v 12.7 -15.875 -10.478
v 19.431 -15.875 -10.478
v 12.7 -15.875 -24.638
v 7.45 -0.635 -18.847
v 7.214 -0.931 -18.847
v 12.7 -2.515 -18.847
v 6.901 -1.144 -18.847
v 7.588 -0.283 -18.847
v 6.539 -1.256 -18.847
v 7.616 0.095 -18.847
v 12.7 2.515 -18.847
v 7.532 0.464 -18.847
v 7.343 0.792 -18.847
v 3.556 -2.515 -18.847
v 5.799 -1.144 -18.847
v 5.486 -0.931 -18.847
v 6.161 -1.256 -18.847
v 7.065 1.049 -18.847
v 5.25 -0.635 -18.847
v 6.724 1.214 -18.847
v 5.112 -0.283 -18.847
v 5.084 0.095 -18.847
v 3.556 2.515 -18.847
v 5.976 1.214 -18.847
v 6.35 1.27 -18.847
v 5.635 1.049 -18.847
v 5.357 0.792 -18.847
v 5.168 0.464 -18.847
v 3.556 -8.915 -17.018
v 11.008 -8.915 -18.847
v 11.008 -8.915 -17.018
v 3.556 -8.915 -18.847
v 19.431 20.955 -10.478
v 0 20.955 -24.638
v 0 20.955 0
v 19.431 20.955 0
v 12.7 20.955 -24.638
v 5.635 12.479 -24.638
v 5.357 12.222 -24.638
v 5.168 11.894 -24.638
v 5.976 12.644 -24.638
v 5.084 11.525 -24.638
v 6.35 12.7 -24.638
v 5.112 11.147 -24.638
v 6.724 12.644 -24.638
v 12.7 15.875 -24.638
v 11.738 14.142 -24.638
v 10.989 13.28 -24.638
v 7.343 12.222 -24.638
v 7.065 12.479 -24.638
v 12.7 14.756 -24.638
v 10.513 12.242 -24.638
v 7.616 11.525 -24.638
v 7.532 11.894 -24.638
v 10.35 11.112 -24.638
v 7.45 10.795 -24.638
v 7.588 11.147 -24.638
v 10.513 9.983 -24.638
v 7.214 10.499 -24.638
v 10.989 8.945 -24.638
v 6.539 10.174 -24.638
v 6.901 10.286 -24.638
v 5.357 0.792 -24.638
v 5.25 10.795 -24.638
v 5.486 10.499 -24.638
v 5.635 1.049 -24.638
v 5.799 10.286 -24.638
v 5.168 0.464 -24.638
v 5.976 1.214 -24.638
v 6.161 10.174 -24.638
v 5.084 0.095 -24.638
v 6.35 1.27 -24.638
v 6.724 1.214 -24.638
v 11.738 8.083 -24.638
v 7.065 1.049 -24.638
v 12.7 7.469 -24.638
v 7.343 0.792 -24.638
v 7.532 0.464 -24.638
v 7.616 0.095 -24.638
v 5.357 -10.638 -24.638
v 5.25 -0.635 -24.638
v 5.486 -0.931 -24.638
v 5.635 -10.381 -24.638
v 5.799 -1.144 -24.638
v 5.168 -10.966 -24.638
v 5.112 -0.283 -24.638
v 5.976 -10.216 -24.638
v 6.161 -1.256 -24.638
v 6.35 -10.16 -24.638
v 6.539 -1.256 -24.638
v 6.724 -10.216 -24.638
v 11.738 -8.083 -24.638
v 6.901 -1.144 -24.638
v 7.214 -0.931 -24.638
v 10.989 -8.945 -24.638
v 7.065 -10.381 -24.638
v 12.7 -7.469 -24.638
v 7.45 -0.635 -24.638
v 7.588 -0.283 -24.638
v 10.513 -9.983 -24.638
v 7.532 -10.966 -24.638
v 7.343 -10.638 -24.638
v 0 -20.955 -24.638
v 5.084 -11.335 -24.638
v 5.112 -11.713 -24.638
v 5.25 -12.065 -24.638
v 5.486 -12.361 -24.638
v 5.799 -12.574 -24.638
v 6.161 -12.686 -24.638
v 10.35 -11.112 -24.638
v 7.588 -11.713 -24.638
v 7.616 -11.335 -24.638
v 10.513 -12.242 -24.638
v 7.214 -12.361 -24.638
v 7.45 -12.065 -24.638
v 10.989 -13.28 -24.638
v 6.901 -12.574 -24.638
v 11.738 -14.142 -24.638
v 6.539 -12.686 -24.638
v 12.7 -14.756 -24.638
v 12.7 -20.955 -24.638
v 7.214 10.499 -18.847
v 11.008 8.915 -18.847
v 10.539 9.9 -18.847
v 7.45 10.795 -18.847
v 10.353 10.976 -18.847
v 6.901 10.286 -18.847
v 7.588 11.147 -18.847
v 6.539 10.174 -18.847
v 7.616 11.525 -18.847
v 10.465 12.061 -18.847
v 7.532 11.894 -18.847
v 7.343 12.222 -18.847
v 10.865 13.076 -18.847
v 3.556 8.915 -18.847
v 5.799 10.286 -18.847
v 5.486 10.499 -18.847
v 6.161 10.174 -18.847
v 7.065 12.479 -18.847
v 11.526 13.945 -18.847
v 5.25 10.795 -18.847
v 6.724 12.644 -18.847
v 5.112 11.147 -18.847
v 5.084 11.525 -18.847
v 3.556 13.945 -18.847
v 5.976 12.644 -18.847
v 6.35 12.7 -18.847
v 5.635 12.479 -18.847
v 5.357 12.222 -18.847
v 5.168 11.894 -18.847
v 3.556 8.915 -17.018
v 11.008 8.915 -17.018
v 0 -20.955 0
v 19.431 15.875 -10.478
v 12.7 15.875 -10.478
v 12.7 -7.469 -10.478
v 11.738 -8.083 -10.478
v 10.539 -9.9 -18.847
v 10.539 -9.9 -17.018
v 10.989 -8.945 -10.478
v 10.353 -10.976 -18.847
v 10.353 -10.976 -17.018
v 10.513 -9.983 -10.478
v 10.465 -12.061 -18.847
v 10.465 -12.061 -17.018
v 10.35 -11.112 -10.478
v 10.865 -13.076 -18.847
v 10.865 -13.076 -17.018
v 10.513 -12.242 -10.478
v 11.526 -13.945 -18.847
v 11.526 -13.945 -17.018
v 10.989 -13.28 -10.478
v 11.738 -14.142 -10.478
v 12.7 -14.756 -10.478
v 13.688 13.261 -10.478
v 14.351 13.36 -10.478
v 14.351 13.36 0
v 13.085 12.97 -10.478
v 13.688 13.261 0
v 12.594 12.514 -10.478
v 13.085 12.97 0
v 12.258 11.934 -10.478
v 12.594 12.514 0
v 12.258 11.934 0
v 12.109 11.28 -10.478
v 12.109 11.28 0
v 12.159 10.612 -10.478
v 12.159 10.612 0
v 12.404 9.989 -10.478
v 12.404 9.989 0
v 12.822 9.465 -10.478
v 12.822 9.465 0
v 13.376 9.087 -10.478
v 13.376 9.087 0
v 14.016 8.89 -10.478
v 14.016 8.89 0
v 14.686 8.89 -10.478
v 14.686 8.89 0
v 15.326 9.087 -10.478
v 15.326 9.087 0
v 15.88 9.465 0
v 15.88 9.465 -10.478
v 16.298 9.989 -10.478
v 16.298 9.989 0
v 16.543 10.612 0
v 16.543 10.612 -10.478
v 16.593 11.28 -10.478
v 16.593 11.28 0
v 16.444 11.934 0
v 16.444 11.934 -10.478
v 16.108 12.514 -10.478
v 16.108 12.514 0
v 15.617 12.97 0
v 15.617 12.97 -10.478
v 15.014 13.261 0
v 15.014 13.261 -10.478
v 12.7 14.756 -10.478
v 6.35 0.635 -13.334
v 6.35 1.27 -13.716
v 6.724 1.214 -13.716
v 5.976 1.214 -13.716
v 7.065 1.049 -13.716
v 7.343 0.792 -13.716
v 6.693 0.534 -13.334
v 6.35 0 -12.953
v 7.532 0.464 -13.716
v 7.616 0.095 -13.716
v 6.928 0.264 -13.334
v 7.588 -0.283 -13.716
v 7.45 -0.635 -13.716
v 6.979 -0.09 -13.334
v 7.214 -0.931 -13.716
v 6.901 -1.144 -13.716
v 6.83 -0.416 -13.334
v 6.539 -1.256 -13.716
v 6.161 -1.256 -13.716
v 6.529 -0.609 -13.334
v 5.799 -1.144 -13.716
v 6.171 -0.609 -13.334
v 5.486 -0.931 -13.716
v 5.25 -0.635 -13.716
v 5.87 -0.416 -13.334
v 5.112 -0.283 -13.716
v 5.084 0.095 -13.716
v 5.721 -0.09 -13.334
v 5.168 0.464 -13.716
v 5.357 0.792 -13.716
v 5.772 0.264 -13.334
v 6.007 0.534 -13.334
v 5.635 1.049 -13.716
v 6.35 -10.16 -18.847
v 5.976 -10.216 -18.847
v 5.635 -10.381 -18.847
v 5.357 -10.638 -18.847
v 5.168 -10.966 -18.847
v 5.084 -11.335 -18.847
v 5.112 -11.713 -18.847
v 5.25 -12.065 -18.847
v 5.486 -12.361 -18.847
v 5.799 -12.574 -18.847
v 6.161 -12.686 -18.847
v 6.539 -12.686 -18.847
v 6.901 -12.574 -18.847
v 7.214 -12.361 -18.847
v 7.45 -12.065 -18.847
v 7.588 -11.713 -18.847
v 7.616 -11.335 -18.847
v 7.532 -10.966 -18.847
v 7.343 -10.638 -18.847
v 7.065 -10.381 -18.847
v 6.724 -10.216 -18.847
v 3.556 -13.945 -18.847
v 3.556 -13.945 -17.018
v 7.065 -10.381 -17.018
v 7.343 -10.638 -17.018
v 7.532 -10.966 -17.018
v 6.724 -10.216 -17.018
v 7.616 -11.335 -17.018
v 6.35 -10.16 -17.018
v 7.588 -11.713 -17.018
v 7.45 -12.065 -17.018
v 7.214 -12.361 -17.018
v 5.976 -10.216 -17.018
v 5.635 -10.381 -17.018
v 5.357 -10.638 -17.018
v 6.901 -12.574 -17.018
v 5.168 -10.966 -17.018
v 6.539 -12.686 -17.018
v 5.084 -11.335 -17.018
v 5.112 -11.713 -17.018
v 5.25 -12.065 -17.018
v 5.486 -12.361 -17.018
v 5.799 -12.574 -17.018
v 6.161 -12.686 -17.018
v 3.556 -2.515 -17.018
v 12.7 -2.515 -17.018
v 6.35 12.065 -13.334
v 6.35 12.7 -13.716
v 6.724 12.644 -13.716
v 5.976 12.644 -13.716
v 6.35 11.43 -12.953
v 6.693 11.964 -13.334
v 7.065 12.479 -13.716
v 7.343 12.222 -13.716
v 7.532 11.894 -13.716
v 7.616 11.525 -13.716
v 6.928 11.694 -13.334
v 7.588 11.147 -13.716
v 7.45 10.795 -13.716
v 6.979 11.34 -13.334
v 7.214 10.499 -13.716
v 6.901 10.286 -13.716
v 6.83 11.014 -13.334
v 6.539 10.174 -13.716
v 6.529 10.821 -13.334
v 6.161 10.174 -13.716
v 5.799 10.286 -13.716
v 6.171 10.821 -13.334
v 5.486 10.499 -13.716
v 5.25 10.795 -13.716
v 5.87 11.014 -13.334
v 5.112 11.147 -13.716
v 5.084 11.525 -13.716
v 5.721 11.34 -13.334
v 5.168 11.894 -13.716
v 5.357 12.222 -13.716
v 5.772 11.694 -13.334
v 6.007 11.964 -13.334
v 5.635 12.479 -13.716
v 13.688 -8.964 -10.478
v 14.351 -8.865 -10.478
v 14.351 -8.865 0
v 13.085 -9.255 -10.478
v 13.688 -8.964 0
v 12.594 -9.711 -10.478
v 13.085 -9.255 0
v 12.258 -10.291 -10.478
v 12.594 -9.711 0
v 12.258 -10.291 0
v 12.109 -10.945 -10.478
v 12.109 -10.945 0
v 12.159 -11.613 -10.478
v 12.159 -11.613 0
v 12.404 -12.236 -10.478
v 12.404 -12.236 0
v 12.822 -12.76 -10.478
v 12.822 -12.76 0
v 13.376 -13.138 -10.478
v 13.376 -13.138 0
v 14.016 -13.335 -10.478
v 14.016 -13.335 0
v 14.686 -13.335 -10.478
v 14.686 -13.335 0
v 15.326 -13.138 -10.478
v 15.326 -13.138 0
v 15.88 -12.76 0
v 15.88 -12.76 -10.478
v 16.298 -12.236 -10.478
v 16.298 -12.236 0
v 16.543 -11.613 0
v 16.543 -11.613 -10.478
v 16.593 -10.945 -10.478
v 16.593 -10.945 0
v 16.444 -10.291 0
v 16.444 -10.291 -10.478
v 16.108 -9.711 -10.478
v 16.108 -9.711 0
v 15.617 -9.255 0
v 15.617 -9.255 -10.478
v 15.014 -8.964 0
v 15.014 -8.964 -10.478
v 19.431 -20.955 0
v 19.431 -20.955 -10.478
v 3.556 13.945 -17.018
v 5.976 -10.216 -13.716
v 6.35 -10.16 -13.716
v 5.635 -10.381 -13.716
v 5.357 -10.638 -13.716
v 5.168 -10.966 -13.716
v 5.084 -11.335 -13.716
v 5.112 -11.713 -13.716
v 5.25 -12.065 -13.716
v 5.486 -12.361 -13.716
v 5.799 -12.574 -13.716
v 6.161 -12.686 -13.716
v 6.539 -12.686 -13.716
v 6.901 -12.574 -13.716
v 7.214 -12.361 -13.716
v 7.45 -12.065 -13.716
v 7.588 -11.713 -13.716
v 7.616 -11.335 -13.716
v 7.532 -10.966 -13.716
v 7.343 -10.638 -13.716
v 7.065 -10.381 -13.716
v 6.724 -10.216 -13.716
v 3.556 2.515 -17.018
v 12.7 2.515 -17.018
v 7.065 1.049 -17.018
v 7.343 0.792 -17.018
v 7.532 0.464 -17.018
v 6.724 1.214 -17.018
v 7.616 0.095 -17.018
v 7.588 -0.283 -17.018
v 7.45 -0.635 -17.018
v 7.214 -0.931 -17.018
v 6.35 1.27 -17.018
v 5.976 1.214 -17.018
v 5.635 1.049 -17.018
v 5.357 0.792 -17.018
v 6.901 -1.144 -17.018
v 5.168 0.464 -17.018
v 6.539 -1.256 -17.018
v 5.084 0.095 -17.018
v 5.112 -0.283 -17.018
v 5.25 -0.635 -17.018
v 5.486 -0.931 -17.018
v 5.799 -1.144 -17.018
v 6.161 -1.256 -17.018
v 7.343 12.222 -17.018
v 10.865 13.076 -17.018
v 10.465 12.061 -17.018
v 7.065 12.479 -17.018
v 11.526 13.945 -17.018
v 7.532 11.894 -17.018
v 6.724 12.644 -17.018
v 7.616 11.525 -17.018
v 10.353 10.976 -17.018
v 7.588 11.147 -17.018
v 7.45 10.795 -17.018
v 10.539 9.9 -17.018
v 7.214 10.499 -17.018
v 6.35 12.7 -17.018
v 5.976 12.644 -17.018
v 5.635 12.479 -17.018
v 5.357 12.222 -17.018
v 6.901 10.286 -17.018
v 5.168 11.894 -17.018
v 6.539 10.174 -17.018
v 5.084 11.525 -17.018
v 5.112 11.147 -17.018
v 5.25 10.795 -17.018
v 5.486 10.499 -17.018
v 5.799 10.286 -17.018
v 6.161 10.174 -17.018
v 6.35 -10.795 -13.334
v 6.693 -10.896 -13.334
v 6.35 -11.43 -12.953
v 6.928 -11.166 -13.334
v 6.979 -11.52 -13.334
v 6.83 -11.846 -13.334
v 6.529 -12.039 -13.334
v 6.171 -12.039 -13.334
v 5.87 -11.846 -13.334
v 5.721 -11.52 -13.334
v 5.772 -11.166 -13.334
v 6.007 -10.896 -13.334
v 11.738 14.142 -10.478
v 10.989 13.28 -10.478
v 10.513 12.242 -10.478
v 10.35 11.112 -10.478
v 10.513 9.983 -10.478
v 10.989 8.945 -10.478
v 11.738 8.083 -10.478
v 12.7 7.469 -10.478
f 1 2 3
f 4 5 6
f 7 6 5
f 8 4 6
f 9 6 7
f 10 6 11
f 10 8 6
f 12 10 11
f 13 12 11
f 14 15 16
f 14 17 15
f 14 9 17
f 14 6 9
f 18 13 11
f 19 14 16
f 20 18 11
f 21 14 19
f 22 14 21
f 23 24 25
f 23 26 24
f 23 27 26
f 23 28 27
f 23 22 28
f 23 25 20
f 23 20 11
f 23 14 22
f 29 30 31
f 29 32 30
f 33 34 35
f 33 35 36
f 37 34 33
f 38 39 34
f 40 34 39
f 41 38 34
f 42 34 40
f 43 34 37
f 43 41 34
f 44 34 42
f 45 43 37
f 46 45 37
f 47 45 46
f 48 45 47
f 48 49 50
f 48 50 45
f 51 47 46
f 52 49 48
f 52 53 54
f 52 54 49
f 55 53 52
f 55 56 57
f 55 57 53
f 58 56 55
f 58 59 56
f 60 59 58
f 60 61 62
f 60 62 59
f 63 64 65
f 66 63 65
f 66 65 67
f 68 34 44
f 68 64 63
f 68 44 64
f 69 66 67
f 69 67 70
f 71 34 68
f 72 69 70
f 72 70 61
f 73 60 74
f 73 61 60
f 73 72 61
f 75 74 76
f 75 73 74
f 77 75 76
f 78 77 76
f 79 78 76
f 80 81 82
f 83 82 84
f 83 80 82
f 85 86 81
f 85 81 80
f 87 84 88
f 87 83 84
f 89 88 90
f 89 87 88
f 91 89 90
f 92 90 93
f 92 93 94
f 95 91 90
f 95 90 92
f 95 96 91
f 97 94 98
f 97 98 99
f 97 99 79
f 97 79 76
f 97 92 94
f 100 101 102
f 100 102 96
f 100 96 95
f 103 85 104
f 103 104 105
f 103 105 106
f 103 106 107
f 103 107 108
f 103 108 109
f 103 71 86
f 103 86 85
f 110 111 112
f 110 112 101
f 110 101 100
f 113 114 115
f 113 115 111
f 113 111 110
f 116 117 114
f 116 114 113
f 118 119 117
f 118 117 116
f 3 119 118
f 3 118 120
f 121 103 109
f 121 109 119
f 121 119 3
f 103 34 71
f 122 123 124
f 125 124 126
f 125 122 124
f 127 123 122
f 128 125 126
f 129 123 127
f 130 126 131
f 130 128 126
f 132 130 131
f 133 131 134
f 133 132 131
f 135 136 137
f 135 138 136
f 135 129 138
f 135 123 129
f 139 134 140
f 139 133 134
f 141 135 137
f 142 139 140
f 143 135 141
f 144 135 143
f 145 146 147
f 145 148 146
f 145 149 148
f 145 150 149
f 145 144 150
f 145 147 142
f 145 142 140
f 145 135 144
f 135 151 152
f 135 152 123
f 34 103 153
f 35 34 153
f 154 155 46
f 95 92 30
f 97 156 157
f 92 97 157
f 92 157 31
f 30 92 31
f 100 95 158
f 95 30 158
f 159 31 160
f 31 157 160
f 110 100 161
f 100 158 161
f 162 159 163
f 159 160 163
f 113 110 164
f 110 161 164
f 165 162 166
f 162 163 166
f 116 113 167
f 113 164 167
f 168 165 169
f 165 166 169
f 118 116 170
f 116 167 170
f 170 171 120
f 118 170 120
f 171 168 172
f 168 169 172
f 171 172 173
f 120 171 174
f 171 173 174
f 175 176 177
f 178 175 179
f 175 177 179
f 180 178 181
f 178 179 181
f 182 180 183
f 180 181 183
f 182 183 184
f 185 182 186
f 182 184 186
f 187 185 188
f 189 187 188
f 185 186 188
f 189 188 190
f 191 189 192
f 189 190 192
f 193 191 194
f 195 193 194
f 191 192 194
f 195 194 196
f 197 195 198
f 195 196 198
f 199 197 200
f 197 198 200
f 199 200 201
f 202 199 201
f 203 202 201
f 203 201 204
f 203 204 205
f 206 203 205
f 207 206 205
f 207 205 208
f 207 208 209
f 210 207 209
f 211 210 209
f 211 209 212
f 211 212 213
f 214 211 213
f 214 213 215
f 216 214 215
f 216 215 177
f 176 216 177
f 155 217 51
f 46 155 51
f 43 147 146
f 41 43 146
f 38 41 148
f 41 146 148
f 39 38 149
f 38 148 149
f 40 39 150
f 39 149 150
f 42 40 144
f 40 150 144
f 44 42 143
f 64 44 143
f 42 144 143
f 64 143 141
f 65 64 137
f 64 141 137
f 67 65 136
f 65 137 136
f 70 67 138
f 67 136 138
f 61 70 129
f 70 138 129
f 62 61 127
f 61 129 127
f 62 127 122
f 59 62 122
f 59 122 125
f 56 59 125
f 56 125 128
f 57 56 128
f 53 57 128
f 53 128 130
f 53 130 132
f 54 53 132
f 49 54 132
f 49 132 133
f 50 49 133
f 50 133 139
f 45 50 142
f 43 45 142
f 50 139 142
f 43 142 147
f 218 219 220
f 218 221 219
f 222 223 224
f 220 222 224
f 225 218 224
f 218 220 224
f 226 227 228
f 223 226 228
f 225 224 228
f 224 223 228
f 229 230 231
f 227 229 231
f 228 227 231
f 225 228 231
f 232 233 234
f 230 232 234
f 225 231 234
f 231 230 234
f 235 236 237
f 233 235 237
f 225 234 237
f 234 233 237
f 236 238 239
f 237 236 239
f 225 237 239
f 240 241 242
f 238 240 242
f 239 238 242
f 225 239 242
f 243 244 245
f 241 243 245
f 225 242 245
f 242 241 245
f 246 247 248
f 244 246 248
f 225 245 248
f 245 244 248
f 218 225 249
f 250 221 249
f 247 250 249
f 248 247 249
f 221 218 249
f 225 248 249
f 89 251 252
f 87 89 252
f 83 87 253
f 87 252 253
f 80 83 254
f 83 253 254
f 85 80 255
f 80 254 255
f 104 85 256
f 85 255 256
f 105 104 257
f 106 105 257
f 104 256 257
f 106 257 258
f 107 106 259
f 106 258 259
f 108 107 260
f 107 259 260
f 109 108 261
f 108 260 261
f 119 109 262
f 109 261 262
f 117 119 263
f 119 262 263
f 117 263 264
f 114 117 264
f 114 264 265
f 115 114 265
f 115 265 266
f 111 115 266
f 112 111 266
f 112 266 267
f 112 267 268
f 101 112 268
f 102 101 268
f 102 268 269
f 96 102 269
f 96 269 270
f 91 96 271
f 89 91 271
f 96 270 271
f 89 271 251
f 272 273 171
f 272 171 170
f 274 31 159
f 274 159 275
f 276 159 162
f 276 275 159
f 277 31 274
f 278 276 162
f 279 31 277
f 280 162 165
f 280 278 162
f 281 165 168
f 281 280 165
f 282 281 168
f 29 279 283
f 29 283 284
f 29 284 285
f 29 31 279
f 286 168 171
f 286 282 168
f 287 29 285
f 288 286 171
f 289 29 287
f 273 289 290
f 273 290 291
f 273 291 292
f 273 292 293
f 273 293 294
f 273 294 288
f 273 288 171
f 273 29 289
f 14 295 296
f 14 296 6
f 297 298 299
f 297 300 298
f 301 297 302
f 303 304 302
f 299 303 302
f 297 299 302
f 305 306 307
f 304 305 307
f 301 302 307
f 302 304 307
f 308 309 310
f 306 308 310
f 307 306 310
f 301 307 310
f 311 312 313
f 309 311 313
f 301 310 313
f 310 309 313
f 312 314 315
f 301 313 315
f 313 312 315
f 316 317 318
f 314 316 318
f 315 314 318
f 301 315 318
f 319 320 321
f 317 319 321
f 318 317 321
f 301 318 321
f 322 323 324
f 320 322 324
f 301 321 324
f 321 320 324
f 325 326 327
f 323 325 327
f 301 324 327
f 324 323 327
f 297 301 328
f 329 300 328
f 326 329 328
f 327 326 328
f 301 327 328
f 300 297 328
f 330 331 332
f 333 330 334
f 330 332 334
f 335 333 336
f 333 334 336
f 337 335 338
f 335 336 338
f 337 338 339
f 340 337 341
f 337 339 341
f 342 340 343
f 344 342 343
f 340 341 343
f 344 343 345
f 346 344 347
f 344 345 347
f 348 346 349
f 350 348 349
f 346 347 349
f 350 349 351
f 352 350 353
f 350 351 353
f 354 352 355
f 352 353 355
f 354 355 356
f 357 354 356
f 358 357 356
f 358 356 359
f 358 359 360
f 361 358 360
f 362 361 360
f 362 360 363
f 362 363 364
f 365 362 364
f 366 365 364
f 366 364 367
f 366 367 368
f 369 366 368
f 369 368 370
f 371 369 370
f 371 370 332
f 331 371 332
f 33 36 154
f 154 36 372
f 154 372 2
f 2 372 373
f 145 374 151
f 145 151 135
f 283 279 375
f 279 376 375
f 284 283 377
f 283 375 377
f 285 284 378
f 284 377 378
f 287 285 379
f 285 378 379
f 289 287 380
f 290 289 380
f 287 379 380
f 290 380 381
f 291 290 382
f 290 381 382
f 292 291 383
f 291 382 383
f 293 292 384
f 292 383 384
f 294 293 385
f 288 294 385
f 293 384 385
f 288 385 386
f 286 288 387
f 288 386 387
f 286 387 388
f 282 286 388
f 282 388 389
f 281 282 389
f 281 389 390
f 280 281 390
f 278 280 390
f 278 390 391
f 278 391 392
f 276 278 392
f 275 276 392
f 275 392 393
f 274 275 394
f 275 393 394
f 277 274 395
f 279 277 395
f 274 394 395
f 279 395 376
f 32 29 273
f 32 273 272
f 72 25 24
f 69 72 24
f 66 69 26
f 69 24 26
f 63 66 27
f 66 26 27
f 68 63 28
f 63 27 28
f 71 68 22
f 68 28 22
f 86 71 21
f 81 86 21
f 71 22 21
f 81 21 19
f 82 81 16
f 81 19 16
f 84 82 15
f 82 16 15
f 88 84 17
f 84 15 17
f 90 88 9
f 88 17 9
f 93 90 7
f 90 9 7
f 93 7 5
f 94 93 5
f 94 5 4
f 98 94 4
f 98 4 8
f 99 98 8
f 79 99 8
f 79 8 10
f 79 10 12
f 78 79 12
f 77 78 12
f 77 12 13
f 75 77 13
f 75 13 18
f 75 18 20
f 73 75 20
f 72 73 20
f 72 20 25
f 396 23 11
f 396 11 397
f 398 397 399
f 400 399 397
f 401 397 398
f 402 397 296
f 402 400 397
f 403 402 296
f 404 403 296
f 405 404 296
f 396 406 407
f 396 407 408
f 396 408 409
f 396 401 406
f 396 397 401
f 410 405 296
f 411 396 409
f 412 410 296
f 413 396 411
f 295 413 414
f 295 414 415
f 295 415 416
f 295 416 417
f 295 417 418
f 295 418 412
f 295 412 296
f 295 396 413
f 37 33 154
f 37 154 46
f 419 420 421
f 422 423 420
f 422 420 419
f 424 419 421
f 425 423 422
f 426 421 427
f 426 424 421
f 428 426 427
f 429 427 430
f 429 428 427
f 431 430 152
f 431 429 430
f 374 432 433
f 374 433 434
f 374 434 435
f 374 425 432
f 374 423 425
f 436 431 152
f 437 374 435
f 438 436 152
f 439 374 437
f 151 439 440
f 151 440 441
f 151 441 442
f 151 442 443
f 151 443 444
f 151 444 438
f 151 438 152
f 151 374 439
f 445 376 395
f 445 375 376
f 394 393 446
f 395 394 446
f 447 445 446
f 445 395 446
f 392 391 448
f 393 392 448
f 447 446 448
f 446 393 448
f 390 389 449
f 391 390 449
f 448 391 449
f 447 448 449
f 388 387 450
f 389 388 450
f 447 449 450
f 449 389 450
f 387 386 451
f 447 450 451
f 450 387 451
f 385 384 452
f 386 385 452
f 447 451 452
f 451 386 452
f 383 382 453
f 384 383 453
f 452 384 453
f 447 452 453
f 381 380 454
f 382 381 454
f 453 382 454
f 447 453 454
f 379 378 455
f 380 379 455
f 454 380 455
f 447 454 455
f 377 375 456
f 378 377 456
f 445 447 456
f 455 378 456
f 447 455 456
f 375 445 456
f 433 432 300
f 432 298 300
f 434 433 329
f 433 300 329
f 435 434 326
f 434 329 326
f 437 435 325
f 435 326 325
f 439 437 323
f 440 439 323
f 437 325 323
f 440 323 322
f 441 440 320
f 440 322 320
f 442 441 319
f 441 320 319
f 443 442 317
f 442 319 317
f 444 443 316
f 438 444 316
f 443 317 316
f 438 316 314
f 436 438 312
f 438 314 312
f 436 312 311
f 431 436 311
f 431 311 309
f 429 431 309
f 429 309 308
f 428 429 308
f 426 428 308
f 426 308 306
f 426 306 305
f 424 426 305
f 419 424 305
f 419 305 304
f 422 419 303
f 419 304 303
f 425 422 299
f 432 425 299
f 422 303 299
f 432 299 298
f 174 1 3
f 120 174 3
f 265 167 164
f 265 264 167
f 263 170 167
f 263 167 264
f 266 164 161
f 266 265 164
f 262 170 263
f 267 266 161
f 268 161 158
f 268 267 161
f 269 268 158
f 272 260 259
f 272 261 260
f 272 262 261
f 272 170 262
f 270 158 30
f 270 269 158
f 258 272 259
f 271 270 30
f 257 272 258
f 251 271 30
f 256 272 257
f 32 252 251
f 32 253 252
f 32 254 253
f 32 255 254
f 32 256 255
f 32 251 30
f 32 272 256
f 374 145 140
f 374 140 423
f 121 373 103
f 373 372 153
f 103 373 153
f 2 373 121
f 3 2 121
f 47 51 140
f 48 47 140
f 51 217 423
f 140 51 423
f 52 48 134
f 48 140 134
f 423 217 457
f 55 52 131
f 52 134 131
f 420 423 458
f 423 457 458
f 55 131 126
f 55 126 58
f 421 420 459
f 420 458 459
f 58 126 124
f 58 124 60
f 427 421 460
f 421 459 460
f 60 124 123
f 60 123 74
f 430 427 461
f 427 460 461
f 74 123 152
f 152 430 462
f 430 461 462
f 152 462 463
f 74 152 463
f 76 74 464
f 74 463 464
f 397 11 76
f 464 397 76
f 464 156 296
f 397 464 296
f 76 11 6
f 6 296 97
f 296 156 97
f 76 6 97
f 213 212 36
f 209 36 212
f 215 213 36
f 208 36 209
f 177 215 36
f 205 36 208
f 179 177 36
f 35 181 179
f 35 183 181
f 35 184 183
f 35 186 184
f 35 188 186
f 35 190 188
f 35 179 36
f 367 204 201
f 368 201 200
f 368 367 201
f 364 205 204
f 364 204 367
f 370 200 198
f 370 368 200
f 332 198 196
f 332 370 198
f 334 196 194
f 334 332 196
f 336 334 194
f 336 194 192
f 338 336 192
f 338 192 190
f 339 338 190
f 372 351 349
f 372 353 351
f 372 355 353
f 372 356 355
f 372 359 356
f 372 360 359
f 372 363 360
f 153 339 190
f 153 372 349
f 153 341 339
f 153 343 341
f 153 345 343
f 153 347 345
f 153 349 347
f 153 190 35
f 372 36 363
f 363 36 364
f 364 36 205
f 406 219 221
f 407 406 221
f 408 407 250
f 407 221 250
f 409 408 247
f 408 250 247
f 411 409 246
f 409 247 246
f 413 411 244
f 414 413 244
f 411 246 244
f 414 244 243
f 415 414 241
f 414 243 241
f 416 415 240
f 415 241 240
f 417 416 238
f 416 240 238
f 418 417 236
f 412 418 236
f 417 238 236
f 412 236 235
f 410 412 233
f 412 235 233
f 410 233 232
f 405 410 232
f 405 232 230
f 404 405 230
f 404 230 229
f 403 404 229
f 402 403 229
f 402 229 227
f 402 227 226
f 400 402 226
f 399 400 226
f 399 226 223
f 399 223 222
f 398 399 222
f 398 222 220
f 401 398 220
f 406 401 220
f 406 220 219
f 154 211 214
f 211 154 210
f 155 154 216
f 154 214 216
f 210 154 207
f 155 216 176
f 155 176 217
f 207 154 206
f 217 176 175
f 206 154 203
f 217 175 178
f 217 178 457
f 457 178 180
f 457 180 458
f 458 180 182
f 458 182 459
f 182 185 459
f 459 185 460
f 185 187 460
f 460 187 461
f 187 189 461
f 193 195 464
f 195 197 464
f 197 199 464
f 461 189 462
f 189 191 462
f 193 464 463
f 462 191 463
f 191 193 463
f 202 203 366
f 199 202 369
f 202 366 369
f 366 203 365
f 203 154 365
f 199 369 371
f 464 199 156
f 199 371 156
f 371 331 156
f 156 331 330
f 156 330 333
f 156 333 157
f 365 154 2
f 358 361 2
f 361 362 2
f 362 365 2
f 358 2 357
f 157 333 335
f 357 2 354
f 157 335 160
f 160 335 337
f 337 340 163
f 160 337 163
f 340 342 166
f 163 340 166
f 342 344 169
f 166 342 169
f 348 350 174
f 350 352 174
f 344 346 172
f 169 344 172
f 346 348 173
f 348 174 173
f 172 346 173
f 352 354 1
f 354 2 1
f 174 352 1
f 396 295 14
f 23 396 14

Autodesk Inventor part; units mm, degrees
ref_plane "YZ Plane" through (0, 0, 0) normal (1, 0, 0) x (0, 1, 0)
ref_plane "XZ Plane" through (0, 0, 0) normal (0, 1, 0) x (-1, 0, 0)
ref_plane "XY Plane" through (0, 0, 0) normal (0, 0, 1) x (1, 0, 0)
sketch "Sketch1" plane through (0, 0, 0) normal (0, 1, 0) x (-1, 0, 0)
  line L0 (0, -29.5656) -> (0, 4.9276) projected
  line L1 (-23.3172, 0) -> (3.8862, 0) projected
  line L2 (0, 0) -> (-19.431, 0)
  line L3 (-19.431, 0) -> (-19.431, -10.4775)
  line L4 (-19.431, -10.4775) -> (0, -10.4775)
  line L5 (0, -10.4775) -> (0, 0)
  line L6 (0, -10.4775) -> (-12.7, -10.4775)
  line L7 (-12.7, -10.4775) -> (-12.7, -24.638)
  line L8 (0, -24.638) -> (0, -10.4775)
  line L9 (0, -24.638) -> (-12.7, -24.638)
  dimension "d10" = 10.4775
  dimension "d36" = 24.638
  dimension "d37" = 12.7
  dimension "d38" = 19.431
extrude "Extrusion3" add sketch "Sketch1" along normal mid plane 41.91
sketch "Sketch2" plane through (19.431, 20.955, -24.638) normal (0, 0, -1) x (-1, 0, 0)
  line L0 (6.731, -41.91) -> (6.731, 0) projected
  line L1 (0, 0) -> (6.731, 0) projected
  line L2 (0, -41.91) -> (0, 0) projected
  line L3 (6.731, -41.91) -> (0, -41.91) projected
  line L4 (-3.8862, -20.955) -> (23.3172, -20.955) projected
  line L5 (19.431, -41.91) -> (19.431, 0) projected
  point P0 (19.431, -20.955)
  point P1 (5.08, -9.8425)
  point P2 (5.08, -32.0675)
  dimension "d73" = 22.225
  dimension "d74" = 11.1125
  dimension "d75" = 14.351
hole "Hole1" at (14.351, 11.1125, -24.638) at (14.351, -11.1125, -24.638) direction (0, 0, 1) diameter 4.4958 end through all counterbore diameter 8.001 counterbore depth 14.1605 clearance for "Socket Head Cap Screw" size "M4" standard "Ansi Metric M Profile"
sketch "Sketch3" plane through (0, -20.955, 0) normal (0, 1, 0) x (-1, 0, 0)
  line L0 (-12.7, -24.638) -> (-12.7, -10.4775) projected
  line L1 (-12.7, -10.4775) -> (-19.431, -10.4775) projected
  line L2 (-19.431, -10.4775) -> (-12.7, -24.638)
  line L3 (-12.7, -24.638) -> (-12.7, -10.4775)
  line L4 (-19.431, -10.4775) -> (-12.7, -10.4775)
  point P0 (0, 0)
extrude "Extrusion4" add sketch "Sketch3" along normal blind 5.08
sketch "Sketch4" plane through (12.7, 20.955, -24.638) normal (0, 0, -1) x (-1, 0, 0)
  line L0 (12.7, -50.292) -> (12.7, 8.382) projected
  line L1 (-10.6172, -20.955) -> (16.5862, -20.955) projected
  line L2 (0, -6.1986) -> (0, 0) projected
  point P0 (12.7, -20.955)
  point P1 (6.35, -9.525)
  point P2 (6.35, -32.385)
  point P3 (6.35, -20.955)
  point P4 (0, -36.83)
  dimension "d39" = 11.43
  dimension "d40" = 11.43
  dimension "d41" = 6.35
  dimension "d63" = 12.7
hole "Hole2" at (6.35, 11.43, -24.638) at (6.35, -11.43, -24.638) at (6.35, 0, -24.638) direction (0, 0, 1) diameter 2.54 depth 10.922 tip angle 118 clearance for "Flat Head Machine Screw (100)" size "#2" standard "Ansi Unified Screw Threads"
sketch "Sketch5" plane through (12.7, 20.955, -10.4775) normal (1, 0, 0) x (0, 0, -1)
  line L0 (-15.4051, -20.955) -> (19.0881, -20.955) projected
  line L1 (-10.4775, -50.292) -> (-10.4775, 8.382) projected
  line L2 (6.5405, -12.0396) -> (8.3693, -12.0396)
  line L3 (8.3693, -12.0396) -> (8.3693, -7.0104)
  line L4 (8.3693, -7.0104) -> (6.5405, -7.0104)
  line L5 (6.5405, -7.0104) -> (6.5405, -12.0396)
  line L6 (6.5405, -12.0396) -> (8.3693, -7.0104) construction
  line L7 (8.3693, -12.0396) -> (6.5405, -7.0104) construction
  line L8 (6.5405, -23.4696) -> (8.3693, -23.4696)
  line L9 (8.3693, -23.4696) -> (8.3693, -18.4404)
  line L10 (8.3693, -18.4404) -> (6.5405, -18.4404)
  line L11 (6.5405, -18.4404) -> (6.5405, -23.4696)
  line L12 (6.5405, -23.4696) -> (8.3693, -18.4404) construction
  line L13 (8.3693, -23.4696) -> (6.5405, -18.4404) construction
  line L14 (6.5405, -34.8996) -> (8.3693, -34.8996)
  line L15 (8.3693, -34.8996) -> (8.3693, -29.8704)
  line L16 (8.3693, -29.8704) -> (6.5405, -29.8704)
  line L17 (6.5405, -29.8704) -> (6.5405, -34.8996)
  line L18 (6.5405, -34.8996) -> (8.3693, -29.8704) construction
  line L19 (8.3693, -34.8996) -> (6.5405, -29.8704) construction
  line L20 (14.1605, -6.1986) -> (14.1605, 0) projected
  point P0 (-10.4775, -20.955)
  point P1 (7.4549, -9.525)
  point P2 (7.4549, -20.955)
  point P3 (7.4549, -32.385)
  point P4 (14.1605, -36.83)
  point P5 (7.4549, -9.525)
  point P6 (7.4549, -32.385)
  dimension "d49" = 5.0292
  dimension "d50" = 1.8288
  dimension "d51" = 11.43
  dimension "d58" = 7.62
  dimension "d59" = 11.43
extrude "Extrusion5" cut sketch "Sketch5" along normal blind 10.16 and the other way blind 9.144
sketch "Sketch6" plane through (0, 20.955, 0) normal (0, 1, 0) x (1, 0, 0)
  line L0 (12.7, 10.4775) -> (12.7, 24.638) projected
  line L1 (19.431, 10.4775) -> (12.7, 10.4775) projected
  line L2 (19.431, 10.4775) -> (12.7, 24.638) projected
  point P0 (0, 0)
extrude "Extrusion6" add sketch "Sketch6" against normal blind 5.08
sketch "Sketch7" plane through (0, 20.955, 0) normal (0, 1, 0) x (1, 0, 0)
  line L0 (0, 0) -> (19.431, 0) projected
  line L1 (19.431, 0) -> (19.431, 10.4775) projected
  line L2 (7.7406, 0) -> (19.5357, -3.1605)
  line L3 (19.5357, -3.1605) -> (19.431, 0)
  line L4 (7.7406, 0) -> (19.431, 0)
  dimension "d64" = 11.684
  dimension "d65" = 15
extrude "Extrusion7" [suppressed]
sketch "Sketch8" plane through (19.431, -20.955, 0) normal (1, 0, 0) x (0, 0, -1)
  line L0 (10.4775, 0) -> (10.4775, 5.08) projected
  line L1 (10.4775, 5.08) -> (10.4775, 36.83) projected
  line L2 (10.4775, 36.83) -> (10.4775, 41.91) projected
  line L3 (0, 41.91) -> (10.4775, 41.91) projected
  line L4 (0, 0) -> (0, 41.91) projected
  line L5 (10.4775, 0) -> (0, 0) projected
  line L6 (10.4775, 41.91) -> (-3.81, 41.91)
  line L7 (-3.81, 41.91) -> (-3.81, 0)
  line L8 (-3.81, 0) -> (10.4775, 0)
  line L9 (10.4775, 0) -> (10.4775, 41.91)
  point P0 (0, 20.955)
  dimension "d68" = 0
  dimension "d69" = 3.81
extrude "Extrusion8" [suppressed]
fillet "Fillet2" [suppressed]
equation "\"d74\" = 0.5 * d73"
equation "\"d23\" = d36 - d10"
equation "\"d40\" = d39"
equation "\"d41\" = 0.5 * d63"
